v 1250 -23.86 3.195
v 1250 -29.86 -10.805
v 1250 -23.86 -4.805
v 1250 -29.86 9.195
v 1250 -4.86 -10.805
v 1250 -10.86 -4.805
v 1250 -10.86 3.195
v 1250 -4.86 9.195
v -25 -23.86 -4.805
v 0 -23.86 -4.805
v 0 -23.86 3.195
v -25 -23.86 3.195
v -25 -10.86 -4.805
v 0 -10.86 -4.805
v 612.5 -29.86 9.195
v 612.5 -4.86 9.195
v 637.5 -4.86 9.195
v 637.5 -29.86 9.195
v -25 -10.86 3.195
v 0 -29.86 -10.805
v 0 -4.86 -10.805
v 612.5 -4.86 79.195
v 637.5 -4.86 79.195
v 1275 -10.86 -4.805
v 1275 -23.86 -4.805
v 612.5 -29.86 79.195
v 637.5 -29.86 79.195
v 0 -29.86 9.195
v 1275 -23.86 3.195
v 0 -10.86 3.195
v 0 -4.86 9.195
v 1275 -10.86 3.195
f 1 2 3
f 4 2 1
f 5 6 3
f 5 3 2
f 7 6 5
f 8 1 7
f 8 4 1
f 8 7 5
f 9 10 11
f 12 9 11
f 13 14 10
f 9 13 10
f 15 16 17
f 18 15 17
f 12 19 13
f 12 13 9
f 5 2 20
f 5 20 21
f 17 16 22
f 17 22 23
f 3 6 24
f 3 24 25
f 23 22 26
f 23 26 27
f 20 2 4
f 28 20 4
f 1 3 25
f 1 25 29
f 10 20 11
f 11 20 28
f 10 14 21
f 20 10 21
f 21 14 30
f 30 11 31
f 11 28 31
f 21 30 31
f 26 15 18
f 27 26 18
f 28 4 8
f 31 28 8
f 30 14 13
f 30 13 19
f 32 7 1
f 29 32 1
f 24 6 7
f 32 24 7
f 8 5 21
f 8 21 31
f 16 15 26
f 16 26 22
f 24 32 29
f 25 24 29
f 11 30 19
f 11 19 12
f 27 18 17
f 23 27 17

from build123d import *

# Parameters (mm, degrees)
F0_W     = 25
F0_H     = 20
F1_DEPTH = 625
F2_W     = 13
F2_H     = 8
F3_DEPTH = 25
F5_W     = 25
F5_H     = 25
F6_DEPTH = 70


with BuildPart() as f1:
    # F0 (on Right) → F1 (new body)
    with BuildSketch(Plane.YZ):
        with Locations((-17.360306, -0.804532)):
            Rectangle(F0_W, F0_H)
    extrude(amount=F1_DEPTH)

    # F2 (on face) → F3 (join)
    with BuildSketch(Plane(origin=(0, 0, 0), x_dir=(0, -1, 0), z_dir=(-1, 0, 0))):
        with Locations((17.360306, -0.804532)):
            Rectangle(F2_W, F2_H)
    extrude(amount=F3_DEPTH)

    # F4: F1 across face


with BuildPart() as f1_1:
    add(f1.part)
    add(f1.part.mirror(Plane(origin=(625, -17.360306, -0.804532), x_dir=(0, 1, 0), z_dir=(1, 0, 0))))


with BuildPart() as f6:
    # F5 (on face) → F6 (new body)
    with BuildSketch(Plane.XY.offset(9.195468)):
        with Locations((625, -17.360306)):
            Rectangle(F5_W, F5_H)
    extrude(amount=F6_DEPTH)


solid = Compound([f1_1.part, f6.part])
